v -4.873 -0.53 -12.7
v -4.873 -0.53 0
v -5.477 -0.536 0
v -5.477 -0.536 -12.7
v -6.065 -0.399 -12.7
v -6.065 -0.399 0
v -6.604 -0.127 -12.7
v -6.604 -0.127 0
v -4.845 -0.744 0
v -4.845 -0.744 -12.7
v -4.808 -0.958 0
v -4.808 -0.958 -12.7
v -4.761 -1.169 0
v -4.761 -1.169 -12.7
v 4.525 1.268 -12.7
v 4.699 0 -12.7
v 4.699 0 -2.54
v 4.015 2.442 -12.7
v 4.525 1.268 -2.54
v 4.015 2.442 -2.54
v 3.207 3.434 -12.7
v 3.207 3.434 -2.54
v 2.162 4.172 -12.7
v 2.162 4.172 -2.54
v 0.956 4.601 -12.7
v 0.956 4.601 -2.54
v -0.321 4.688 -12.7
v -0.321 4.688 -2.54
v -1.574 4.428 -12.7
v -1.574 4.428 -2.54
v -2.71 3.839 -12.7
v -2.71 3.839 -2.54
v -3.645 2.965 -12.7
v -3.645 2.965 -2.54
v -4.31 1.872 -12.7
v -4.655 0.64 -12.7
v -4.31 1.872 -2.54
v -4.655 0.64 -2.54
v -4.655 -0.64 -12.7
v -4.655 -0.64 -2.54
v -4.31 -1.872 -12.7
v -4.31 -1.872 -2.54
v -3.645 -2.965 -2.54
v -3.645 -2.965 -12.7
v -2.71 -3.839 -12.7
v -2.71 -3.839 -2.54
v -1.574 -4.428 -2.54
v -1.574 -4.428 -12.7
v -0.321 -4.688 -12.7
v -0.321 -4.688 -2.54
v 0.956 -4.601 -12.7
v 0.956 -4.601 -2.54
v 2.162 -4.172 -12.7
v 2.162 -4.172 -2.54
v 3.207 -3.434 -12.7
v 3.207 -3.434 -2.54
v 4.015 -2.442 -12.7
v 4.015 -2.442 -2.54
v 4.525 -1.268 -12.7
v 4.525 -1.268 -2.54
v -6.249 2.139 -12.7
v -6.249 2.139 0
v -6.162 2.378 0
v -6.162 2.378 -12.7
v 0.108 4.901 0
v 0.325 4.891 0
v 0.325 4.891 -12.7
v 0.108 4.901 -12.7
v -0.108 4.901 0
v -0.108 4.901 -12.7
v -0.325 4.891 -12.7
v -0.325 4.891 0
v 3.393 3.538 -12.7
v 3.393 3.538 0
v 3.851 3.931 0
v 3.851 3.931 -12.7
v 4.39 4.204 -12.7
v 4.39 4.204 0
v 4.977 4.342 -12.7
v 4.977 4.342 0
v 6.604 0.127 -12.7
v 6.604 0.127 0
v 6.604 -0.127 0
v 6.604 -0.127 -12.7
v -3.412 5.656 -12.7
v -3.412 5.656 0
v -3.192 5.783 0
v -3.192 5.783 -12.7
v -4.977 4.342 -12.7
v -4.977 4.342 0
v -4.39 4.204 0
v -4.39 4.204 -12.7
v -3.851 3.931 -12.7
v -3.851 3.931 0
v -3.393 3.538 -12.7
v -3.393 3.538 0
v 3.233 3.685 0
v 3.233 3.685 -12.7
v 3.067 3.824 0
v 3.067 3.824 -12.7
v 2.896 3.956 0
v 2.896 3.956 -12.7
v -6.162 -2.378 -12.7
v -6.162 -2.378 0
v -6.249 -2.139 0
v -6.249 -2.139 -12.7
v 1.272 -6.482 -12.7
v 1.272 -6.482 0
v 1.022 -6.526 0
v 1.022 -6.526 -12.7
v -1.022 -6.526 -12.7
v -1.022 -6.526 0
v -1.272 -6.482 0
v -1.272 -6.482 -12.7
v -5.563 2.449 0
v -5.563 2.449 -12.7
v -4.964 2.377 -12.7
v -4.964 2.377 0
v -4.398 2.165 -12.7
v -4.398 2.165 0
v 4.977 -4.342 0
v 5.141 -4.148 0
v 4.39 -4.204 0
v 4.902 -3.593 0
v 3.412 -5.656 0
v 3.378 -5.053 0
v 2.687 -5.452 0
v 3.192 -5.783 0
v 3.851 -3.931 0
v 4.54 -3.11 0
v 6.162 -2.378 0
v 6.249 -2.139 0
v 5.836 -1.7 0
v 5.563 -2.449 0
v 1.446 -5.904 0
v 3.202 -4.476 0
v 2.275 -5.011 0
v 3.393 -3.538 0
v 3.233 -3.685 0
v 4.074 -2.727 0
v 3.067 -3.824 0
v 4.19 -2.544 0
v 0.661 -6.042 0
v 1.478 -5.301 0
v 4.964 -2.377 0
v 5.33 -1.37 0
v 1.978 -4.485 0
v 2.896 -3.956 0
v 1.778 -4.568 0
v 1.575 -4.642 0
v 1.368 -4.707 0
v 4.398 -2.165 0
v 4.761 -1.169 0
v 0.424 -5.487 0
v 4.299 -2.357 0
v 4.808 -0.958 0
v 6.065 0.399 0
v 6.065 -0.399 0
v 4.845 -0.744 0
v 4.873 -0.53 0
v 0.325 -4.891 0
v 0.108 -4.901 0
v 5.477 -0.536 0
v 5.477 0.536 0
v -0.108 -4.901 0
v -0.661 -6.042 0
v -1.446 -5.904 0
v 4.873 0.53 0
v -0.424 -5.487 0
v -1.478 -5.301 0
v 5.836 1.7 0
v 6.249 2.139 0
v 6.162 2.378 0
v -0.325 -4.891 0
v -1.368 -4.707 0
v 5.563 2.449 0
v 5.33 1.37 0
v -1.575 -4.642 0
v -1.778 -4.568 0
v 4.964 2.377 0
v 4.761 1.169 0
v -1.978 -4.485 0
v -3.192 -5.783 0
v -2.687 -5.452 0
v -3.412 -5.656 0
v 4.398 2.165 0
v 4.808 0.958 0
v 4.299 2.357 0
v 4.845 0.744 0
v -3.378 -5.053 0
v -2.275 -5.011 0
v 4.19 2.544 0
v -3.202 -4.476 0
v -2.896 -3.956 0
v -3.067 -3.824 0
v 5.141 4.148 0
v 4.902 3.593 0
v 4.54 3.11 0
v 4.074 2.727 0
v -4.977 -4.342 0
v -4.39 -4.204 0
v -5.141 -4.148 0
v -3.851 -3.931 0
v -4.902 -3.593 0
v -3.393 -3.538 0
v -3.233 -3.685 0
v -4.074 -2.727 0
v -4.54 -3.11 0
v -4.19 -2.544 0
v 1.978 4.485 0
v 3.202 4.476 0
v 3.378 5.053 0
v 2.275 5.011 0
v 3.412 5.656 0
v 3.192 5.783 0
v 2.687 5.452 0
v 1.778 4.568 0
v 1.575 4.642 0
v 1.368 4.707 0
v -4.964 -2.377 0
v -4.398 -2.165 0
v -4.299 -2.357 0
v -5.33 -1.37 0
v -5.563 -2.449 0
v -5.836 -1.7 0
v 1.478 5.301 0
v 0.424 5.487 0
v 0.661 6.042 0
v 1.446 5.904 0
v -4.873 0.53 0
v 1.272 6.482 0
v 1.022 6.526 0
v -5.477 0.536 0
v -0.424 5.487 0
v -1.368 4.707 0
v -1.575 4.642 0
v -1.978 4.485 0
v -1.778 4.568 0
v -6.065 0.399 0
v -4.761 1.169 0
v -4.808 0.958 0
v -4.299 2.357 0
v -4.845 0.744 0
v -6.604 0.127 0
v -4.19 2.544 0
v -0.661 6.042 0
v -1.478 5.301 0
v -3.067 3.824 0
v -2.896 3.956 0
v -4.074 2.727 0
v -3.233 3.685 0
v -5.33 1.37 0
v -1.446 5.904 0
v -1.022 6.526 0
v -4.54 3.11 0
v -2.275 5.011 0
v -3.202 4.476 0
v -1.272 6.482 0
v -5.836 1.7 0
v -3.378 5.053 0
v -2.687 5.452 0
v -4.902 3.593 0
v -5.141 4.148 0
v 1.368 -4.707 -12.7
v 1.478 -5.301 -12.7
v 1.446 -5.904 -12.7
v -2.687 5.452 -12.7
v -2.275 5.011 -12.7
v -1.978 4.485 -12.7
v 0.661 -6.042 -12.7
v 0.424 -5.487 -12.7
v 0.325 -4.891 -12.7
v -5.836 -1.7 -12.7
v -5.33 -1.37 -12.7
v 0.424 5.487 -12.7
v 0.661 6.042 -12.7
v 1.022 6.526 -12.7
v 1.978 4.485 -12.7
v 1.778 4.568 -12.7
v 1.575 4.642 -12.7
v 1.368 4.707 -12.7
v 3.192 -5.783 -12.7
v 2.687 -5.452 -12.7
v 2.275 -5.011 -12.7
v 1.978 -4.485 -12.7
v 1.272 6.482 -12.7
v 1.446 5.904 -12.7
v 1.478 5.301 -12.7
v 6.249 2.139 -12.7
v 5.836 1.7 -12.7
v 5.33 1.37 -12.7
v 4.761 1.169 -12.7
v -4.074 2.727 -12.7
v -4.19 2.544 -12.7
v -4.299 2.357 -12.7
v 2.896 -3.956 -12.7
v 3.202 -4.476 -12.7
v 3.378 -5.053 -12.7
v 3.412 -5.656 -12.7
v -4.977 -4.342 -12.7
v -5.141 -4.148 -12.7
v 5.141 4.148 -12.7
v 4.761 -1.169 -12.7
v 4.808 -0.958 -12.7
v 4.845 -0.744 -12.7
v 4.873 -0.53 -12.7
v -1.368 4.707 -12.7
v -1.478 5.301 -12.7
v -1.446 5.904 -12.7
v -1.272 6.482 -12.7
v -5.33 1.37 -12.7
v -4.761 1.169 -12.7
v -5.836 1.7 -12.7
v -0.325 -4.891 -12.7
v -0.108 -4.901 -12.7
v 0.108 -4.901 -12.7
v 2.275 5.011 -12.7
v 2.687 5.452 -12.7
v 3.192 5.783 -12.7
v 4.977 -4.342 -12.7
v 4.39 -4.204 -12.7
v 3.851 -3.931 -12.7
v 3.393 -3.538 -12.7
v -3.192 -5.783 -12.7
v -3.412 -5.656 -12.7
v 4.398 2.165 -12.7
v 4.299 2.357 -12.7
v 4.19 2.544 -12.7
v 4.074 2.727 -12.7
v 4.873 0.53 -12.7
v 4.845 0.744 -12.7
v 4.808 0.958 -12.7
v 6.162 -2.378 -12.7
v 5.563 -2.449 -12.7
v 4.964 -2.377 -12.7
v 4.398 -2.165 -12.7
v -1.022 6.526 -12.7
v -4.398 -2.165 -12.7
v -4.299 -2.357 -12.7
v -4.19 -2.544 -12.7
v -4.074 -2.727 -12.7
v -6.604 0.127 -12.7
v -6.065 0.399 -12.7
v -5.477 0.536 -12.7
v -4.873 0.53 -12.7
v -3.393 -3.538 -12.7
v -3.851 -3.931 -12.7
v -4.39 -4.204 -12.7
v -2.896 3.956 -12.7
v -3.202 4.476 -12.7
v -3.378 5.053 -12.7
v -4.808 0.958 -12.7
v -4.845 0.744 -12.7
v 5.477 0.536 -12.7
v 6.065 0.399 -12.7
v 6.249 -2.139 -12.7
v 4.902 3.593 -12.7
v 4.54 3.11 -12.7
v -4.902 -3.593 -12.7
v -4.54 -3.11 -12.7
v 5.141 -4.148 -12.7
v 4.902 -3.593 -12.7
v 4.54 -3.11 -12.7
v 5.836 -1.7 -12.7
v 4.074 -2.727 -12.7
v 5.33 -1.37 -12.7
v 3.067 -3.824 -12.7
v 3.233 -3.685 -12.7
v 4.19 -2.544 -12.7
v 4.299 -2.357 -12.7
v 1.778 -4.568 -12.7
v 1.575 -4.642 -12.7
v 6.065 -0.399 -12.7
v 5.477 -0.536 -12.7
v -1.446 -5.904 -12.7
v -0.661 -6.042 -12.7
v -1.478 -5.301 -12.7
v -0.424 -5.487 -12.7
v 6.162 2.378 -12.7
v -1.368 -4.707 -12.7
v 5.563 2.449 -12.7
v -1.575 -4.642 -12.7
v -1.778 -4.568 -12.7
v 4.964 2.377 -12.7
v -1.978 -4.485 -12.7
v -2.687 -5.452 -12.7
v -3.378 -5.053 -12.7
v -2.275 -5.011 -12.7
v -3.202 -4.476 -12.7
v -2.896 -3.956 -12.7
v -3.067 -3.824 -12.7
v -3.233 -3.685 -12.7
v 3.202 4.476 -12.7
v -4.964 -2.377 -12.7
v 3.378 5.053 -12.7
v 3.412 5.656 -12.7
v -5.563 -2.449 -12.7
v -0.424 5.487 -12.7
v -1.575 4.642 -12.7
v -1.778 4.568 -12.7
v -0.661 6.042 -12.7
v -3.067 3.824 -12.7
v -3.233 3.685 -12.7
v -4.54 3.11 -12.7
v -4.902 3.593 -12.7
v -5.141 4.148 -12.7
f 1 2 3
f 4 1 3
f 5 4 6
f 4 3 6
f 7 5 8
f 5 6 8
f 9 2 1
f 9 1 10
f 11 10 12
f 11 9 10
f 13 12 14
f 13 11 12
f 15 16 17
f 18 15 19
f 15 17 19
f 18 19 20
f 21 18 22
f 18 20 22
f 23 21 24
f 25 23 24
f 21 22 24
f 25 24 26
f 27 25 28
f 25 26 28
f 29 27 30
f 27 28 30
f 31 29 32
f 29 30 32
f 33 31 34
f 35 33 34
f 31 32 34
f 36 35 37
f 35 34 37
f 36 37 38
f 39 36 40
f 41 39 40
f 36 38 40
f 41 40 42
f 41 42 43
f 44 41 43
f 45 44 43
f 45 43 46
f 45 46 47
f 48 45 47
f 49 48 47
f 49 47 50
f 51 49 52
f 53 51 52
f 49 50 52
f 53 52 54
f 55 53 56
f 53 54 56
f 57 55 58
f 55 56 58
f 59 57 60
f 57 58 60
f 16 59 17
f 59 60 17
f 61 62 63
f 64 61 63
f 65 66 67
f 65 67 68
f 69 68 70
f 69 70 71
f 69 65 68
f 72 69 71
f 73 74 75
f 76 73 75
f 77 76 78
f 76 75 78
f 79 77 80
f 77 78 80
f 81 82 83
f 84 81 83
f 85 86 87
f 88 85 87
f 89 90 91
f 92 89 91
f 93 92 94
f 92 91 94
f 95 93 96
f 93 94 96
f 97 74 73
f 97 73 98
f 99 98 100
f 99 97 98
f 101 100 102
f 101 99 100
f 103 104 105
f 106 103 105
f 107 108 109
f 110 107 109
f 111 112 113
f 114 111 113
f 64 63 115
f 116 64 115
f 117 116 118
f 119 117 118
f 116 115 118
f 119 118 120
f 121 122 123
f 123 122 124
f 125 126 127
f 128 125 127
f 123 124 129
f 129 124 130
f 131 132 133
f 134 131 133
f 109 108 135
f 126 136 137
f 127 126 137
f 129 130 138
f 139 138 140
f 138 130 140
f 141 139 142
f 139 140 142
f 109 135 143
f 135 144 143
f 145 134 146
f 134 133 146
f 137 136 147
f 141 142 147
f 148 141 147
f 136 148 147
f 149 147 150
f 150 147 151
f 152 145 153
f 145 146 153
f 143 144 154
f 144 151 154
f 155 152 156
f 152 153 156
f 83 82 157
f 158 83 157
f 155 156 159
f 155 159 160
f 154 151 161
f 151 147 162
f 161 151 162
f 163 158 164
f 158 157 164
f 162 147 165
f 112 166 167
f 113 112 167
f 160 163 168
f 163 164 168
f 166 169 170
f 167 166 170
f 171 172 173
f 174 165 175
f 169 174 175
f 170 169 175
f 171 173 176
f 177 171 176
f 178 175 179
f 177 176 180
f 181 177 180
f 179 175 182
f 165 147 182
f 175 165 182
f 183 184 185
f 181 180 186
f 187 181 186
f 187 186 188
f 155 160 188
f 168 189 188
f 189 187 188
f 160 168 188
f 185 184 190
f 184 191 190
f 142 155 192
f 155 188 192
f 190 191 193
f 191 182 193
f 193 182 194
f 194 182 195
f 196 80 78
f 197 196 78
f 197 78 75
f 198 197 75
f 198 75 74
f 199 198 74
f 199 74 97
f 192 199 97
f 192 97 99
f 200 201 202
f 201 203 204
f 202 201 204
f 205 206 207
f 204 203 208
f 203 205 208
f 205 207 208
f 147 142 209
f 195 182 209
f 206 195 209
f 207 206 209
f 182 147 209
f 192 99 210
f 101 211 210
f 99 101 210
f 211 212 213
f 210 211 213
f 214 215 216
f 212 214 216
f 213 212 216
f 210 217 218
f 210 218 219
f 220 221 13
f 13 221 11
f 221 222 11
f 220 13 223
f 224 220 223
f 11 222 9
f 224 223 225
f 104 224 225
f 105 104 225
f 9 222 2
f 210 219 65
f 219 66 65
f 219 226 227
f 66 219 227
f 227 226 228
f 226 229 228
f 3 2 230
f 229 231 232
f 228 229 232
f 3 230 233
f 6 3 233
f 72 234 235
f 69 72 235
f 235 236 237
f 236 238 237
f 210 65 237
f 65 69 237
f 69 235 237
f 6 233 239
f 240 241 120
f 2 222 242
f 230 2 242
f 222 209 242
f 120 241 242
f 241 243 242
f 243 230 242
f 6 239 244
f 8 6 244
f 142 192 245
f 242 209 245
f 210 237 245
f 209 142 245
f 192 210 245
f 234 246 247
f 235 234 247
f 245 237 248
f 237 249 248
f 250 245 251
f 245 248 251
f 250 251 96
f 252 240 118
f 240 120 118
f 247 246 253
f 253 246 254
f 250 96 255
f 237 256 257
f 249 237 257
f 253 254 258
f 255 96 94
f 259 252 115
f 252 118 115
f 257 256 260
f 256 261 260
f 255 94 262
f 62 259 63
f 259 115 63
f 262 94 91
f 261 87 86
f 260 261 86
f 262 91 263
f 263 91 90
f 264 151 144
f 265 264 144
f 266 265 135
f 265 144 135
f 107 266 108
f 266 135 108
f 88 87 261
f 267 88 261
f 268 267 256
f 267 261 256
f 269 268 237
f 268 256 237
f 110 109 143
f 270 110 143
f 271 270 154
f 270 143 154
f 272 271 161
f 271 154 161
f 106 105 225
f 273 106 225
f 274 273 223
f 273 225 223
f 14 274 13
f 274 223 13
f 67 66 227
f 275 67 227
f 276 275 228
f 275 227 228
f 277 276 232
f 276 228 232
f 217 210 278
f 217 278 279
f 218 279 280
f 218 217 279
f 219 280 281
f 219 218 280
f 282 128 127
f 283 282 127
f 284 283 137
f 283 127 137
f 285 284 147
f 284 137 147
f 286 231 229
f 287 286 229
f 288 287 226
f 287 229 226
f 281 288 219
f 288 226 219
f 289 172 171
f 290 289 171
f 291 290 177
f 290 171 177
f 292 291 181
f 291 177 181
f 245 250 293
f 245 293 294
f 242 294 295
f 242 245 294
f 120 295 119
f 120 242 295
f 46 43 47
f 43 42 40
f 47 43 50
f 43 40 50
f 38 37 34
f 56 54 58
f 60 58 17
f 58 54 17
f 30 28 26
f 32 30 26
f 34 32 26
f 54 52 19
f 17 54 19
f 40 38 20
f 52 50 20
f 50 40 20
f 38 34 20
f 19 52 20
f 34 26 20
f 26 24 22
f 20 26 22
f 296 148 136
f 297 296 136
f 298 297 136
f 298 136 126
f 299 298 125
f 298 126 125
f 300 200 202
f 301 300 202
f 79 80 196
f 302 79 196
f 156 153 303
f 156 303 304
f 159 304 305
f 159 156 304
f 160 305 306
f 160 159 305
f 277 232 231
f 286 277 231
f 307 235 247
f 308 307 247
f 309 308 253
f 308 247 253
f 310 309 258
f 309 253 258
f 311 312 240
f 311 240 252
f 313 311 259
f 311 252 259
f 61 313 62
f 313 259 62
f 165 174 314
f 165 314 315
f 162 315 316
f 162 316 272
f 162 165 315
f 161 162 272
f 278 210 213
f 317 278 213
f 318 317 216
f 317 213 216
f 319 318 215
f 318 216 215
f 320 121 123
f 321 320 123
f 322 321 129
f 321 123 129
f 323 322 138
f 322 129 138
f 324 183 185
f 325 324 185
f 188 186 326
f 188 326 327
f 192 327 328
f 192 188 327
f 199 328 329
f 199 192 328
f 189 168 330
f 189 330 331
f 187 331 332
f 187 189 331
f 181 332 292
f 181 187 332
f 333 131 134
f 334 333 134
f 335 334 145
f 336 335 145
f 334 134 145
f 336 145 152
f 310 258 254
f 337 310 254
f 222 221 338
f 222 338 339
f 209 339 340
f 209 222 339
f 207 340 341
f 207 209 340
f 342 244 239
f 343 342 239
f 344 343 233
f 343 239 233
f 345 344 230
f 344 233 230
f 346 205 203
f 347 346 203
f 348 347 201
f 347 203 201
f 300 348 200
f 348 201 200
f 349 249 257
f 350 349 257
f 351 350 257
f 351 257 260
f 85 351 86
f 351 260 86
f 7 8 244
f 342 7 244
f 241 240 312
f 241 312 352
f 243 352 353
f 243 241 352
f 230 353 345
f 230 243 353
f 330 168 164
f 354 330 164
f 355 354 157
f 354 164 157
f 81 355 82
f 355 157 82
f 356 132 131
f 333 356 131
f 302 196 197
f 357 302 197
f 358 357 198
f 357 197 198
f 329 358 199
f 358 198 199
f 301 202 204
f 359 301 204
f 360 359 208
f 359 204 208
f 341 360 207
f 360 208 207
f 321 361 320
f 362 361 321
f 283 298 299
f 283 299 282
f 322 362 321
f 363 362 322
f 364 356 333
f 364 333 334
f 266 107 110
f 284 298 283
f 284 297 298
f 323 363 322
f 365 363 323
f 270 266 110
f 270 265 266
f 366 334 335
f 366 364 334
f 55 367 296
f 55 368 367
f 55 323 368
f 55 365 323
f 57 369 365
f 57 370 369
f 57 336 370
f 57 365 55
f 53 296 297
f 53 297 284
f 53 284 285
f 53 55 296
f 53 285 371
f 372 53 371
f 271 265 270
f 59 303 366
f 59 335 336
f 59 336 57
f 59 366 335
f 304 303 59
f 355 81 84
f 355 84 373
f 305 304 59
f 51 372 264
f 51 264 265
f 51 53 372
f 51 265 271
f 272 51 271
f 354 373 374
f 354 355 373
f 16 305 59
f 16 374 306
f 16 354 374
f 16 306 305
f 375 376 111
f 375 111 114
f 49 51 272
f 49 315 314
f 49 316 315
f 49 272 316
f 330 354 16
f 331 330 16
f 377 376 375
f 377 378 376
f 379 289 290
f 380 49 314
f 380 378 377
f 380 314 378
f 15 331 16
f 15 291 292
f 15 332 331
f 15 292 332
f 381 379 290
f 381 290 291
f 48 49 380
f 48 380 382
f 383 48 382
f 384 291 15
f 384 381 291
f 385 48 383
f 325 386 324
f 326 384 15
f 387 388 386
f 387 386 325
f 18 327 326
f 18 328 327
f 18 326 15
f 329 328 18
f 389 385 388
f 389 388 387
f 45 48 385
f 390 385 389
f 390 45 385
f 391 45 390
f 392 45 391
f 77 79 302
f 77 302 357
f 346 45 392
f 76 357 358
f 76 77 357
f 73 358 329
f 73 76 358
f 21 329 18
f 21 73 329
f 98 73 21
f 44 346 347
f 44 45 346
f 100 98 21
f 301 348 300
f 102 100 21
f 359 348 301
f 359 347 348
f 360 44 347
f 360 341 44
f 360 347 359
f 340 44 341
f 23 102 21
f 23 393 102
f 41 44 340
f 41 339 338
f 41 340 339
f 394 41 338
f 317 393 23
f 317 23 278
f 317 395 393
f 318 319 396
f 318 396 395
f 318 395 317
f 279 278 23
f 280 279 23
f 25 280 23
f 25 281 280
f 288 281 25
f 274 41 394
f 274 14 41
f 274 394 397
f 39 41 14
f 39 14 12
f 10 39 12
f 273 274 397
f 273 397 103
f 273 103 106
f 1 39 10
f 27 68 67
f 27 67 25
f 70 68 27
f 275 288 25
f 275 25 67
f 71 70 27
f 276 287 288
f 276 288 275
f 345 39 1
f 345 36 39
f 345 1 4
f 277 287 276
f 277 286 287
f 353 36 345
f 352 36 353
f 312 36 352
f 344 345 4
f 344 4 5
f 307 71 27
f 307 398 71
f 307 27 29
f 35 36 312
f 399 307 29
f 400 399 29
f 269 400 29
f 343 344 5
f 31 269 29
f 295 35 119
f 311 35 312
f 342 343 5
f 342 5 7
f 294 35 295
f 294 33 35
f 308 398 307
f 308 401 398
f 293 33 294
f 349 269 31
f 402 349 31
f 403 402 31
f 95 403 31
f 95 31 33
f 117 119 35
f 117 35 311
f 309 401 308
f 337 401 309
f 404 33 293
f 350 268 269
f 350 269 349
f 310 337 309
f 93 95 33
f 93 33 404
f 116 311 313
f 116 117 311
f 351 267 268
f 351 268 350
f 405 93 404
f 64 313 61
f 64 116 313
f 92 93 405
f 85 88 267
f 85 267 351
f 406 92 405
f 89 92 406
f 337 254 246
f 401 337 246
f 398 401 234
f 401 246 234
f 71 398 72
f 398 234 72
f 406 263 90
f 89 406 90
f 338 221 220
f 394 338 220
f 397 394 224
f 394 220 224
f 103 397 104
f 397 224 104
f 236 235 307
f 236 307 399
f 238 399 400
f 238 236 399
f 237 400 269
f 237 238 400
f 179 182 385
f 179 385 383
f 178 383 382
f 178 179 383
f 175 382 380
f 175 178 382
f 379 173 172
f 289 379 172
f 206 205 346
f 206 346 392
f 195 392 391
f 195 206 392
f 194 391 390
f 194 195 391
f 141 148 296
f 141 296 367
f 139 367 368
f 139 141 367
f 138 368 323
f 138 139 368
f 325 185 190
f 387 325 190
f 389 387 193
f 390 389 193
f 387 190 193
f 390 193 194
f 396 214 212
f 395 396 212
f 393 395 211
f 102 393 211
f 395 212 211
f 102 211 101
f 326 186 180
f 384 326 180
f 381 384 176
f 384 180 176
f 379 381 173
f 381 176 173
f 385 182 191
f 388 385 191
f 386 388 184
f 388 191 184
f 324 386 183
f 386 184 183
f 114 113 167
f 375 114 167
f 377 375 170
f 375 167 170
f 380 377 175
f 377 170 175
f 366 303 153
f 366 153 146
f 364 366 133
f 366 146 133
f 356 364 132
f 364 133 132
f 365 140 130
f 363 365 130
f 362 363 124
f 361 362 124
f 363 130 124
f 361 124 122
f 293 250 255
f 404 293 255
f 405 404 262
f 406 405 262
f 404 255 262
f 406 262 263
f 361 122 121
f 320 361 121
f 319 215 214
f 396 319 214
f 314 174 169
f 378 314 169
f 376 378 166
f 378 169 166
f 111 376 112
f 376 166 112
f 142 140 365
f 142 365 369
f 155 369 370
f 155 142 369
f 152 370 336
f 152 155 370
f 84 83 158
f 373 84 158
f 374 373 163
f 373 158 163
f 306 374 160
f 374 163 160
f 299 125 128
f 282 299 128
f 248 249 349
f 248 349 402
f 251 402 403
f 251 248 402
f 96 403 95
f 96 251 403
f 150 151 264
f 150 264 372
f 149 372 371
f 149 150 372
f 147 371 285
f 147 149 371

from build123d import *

# Parameters (mm, degrees)
BOSS_EXTRUDE1_DEPTH = 12.7
LARGER_TEETH_DEPTH  = 12.7
CUT_EXTRUDE1_START  = -2.54
SKETCH2_R           = 4.699
CUT_EXTRUDE1_DEPTH  = 10.16


with BuildPart() as part:
    # Sketch1 → Boss-Extrude1 (new body)
    with BuildSketch(Plane.XY):
        with BuildLine():
            ThreePointArc((4.073847183, 2.72678088), (4.623694629, 3.268673913), (4.961814921, 3.962687559))
            ThreePointArc((4.961814921, 3.962687559), (4.864382214, 4.081701322), (4.76409555, 4.19832033))
            ThreePointArc((4.76409555, 4.19832033), (4.021911558, 3.98585105), (3.392771091, 3.53845576))
            ThreePointArc((3.392771091, 3.53845576), (3.15107342, 3.755303069), (2.895550149, 3.955673669))
            ThreePointArc((2.895550149, 3.955673669), (3.226899403, 4.652945455), (3.3072619, 5.420748908))
            ThreePointArc((3.3072619, 5.420748908), (3.175, 5.499261314), (3.040875312, 5.574547276))
            ThreePointArc((3.040875312, 5.574547276), (2.416119265, 5.121049586), (1.977938812, 4.485456821))
            ThreePointArc((1.977938812, 4.485456821), (1.676651147, 4.606561166), (1.368007033, 4.707453834))
            ThreePointArc((1.368007033, 4.707453834), (1.440892486, 5.476003106), (1.253804284, 6.224987937))
            ThreePointArc((1.253804284, 6.224987937), (1.102665928, 6.253529232), (0.950880633, 6.27840155))
            ThreePointArc((0.950880633, 6.27840155), (0.518907331, 5.638573964), (0.324537921, 4.891445592))
            ThreePointArc((0.324537921, 4.891445592), (0, 4.9022), (-0.324537921, 4.891445592))
            ThreePointArc((-0.324537921, 4.891445592), (-0.518907331, 5.638573964), (-0.950880633, 6.27840155))
            ThreePointArc((-0.950880633, 6.27840155), (-1.102665928, 6.253529232), (-1.253804284, 6.224987937))
            ThreePointArc((-1.253804284, 6.224987937), (-1.440892486, 5.476003106), (-1.368007033, 4.707453834))
            ThreePointArc((-1.368007033, 4.707453834), (-1.676651147, 4.606561166), (-1.977938812, 4.485456821))
            ThreePointArc((-1.977938812, 4.485456821), (-2.416119265, 5.121049586), (-3.040875312, 5.574547276))
            ThreePointArc((-3.040875312, 5.574547276), (-3.175, 5.499261314), (-3.3072619, 5.420748908))
            ThreePointArc((-3.3072619, 5.420748908), (-3.226899403, 4.652945455), (-2.895550149, 3.955673669))
            ThreePointArc((-2.895550149, 3.955673669), (-3.15107342, 3.755303069), (-3.392771091, 3.53845576))
            ThreePointArc((-3.392771091, 3.53845576), (-4.021911558, 3.98585105), (-4.76409555, 4.19832033))
            ThreePointArc((-4.76409555, 4.19832033), (-4.864382214, 4.081701322), (-4.961814921, 3.962687559))
            ThreePointArc((-4.961814921, 3.962687559), (-4.623694629, 3.268673913), (-4.073847183, 2.72678088))
            ThreePointArc((-4.073847183, 2.72678088), (-4.245429734, 2.4511), (-4.398385104, 2.164664712))
            ThreePointArc((-4.398385104, 2.164664712), (-5.14260196, 2.369900051), (-5.912695554, 2.315713991))
            ThreePointArc((-5.912695554, 2.315713991), (-5.967048142, 2.17182791), (-6.017899834, 2.026667607))
            ThreePointArc((-6.017899834, 2.026667607), (-5.462804044, 1.490152056), (-4.760778124, 1.168998074))
            ThreePointArc((-4.760778124, 1.168998074), (-4.827724567, 0.851258097), (-4.873488961, 0.529783153))
            ThreePointArc((-4.873488961, 0.529783153), (-5.643018669, 0.468104131), (-6.348137212, 0.153798368))
            ThreePointArc((-6.348137212, 0.153798368), (-6.35, 0), (-6.348137212, -0.153798368))
            ThreePointArc((-6.348137212, -0.153798368), (-5.643018669, -0.468104131), (-4.873488961, -0.529783153))
            ThreePointArc((-4.873488961, -0.529783153), (-4.827724567, -0.851258097), (-4.760778124, -1.168998074))
            ThreePointArc((-4.760778124, -1.168998074), (-5.462804044, -1.490152056), (-6.017899834, -2.026667607))
            ThreePointArc((-6.017899834, -2.026667607), (-5.967048142, -2.17182791), (-5.912695554, -2.315713991))
            ThreePointArc((-5.912695554, -2.315713991), (-5.14260196, -2.369900051), (-4.398385104, -2.164664712))
            ThreePointArc((-4.398385104, -2.164664712), (-4.245429734, -2.4511), (-4.073847183, -2.72678088))
            ThreePointArc((-4.073847183, -2.72678088), (-4.623694629, -3.268673913), (-4.961814921, -3.962687559))
            ThreePointArc((-4.961814921, -3.962687559), (-4.864382214, -4.081701322), (-4.76409555, -4.19832033))
            ThreePointArc((-4.76409555, -4.19832033), (-4.021911558, -3.98585105), (-3.392771091, -3.53845576))
            ThreePointArc((-3.392771091, -3.53845576), (-3.15107342, -3.755303069), (-2.895550149, -3.955673669))
            ThreePointArc((-2.895550149, -3.955673669), (-3.226899403, -4.652945455), (-3.3072619, -5.420748908))
            ThreePointArc((-3.3072619, -5.420748908), (-3.175, -5.499261314), (-3.040875312, -5.574547276))
            ThreePointArc((-3.040875312, -5.574547276), (-2.416119265, -5.121049586), (-1.977938812, -4.485456821))
            ThreePointArc((-1.977938812, -4.485456821), (-1.676651147, -4.606561166), (-1.368007033, -4.707453834))
            ThreePointArc((-1.368007033, -4.707453834), (-1.440892486, -5.476003106), (-1.253804284, -6.224987937))
            ThreePointArc((-1.253804284, -6.224987937), (-1.102665928, -6.253529232), (-0.950880633, -6.27840155))
            ThreePointArc((-0.950880633, -6.27840155), (-0.518907331, -5.638573964), (-0.324537921, -4.891445592))
            ThreePointArc((-0.324537921, -4.891445592), (0, -4.9022), (0.324537921, -4.891445592))
            ThreePointArc((0.324537921, -4.891445592), (0.518907331, -5.638573964), (0.950880633, -6.27840155))
            ThreePointArc((0.950880633, -6.27840155), (1.102665928, -6.253529232), (1.253804284, -6.224987937))
            ThreePointArc((1.253804284, -6.224987937), (1.440892486, -5.476003106), (1.368007033, -4.707453834))
            ThreePointArc((1.368007033, -4.707453834), (1.676651147, -4.606561166), (1.977938812, -4.485456821))
            ThreePointArc((1.977938812, -4.485456821), (2.416119265, -5.121049586), (3.040875312, -5.574547276))
            ThreePointArc((3.040875312, -5.574547276), (3.175, -5.499261314), (3.3072619, -5.420748908))
            ThreePointArc((3.3072619, -5.420748908), (3.226899403, -4.652945455), (2.895550149, -3.955673669))
            ThreePointArc((2.895550149, -3.955673669), (3.15107342, -3.755303069), (3.392771091, -3.53845576))
            ThreePointArc((3.392771091, -3.53845576), (4.021911558, -3.98585105), (4.76409555, -4.19832033))
            ThreePointArc((4.76409555, -4.19832033), (4.864382214, -4.081701322), (4.961814921, -3.962687559))
            ThreePointArc((4.961814921, -3.962687559), (4.623694629, -3.268673913), (4.073847183, -2.72678088))
            ThreePointArc((4.073847183, -2.72678088), (4.245429734, -2.4511), (4.398385104, -2.164664712))
            ThreePointArc((4.398385104, -2.164664712), (5.14260196, -2.369900051), (5.912695554, -2.315713991))
            ThreePointArc((5.912695554, -2.315713991), (5.967048142, -2.17182791), (6.017899834, -2.026667607))
            ThreePointArc((6.017899834, -2.026667607), (5.462804044, -1.490152056), (4.760778124, -1.168998074))
            ThreePointArc((4.760778124, -1.168998074), (4.827724567, -0.851258097), (4.873488961, -0.529783153))
            ThreePointArc((4.873488961, -0.529783153), (5.643018669, -0.468104131), (6.348137212, -0.153798368))
            ThreePointArc((6.348137212, -0.153798368), (6.35, 0), (6.348137212, 0.153798368))
            ThreePointArc((6.348137212, 0.153798368), (5.643018669, 0.468104131), (4.873488961, 0.529783153))
            ThreePointArc((4.873488961, 0.529783153), (4.827724567, 0.851258097), (4.760778124, 1.168998074))
            ThreePointArc((4.760778124, 1.168998074), (5.462804044, 1.490152056), (6.017899834, 2.026667607))
            ThreePointArc((6.017899834, 2.026667607), (5.967048142, 2.17182791), (5.912695554, 2.315713991))
            ThreePointArc((5.912695554, 2.315713991), (5.14260196, 2.369900051), (4.398385104, 2.164664712))
            ThreePointArc((4.398385104, 2.164664712), (4.245429734, 2.4511), (4.073847183, 2.72678088))
        make_face()
    extrude(amount=-BOSS_EXTRUDE1_DEPTH)

    # Sketch3 → Larger_Teeth (add)
    with BuildSketch(Plane.XY):
        with BuildLine():
            Line((6.604, 0.127), (6.604, -0.127))
            ThreePointArc((6.604, -0.127), (5.775112058, -0.48464065), (4.873488961, -0.529783153))
            ThreePointArc((4.873488961, -0.529783153), (4.827724567, -0.851258097), (4.760778124, -1.168998074))
            ThreePointArc((4.760778124, -1.168998074), (5.592587049, -1.519791412), (6.249166626, -2.139360064))
            Line((6.249166626, -2.139360064), (6.162293509, -2.378041989))
            ThreePointArc((6.162293509, -2.378041989), (5.261073321, -2.430617896), (4.398385104, -2.164664712))
            ThreePointArc((4.398385104, -2.164664712), (4.245429734, -2.4511), (4.073847183, -2.72678088))
            ThreePointArc((4.073847183, -2.72678088), (4.735513505, -3.340914199), (5.140591529, -4.14768173))
            Line((5.140591529, -4.14768173), (4.977323476, -4.342257019))
            ThreePointArc((4.977323476, -4.342257019), (4.112471496, -4.083426752), (3.392771091, -3.53845576))
            ThreePointArc((3.392771091, -3.53845576), (3.15107342, -3.755303069), (2.895550149, -3.955673669))
            ThreePointArc((2.895550149, -3.955673669), (3.307267143, -4.759073427), (3.411985226, -5.655731767))
            Line((3.411985226, -5.655731767), (3.192014774, -5.782731767))
            ThreePointArc((3.192014774, -5.782731767), (2.467844915, -5.243714077), (1.977938812, -4.485456821))
            ThreePointArc((1.977938812, -4.485456821), (1.676651147, -4.606561166), (1.368007033, -4.707453834))
            ThreePointArc((1.368007033, -4.707453834), (1.480115554, -5.603218164), (1.27184315, -6.481617082))
            Line((1.27184315, -6.481617082), (1.021701981, -6.525723719))
            ThreePointArc((1.021701981, -6.525723719), (0.525559816, -5.771532095), (0.324537921, -4.891445592))
            ThreePointArc((0.324537921, -4.891445592), (0, -4.9022), (-0.324537921, -4.891445592))
            ThreePointArc((-0.324537921, -4.891445592), (-0.525559816, -5.771532095), (-1.021701981, -6.525723719))
            Line((-1.021701981, -6.525723719), (-1.27184315, -6.481617082))
            ThreePointArc((-1.27184315, -6.481617082), (-1.480115554, -5.603218164), (-1.368007033, -4.707453834))
            ThreePointArc((-1.368007033, -4.707453834), (-1.676651147, -4.606561166), (-1.977938812, -4.485456821))
            ThreePointArc((-1.977938812, -4.485456821), (-2.467844915, -5.243714077), (-3.192014774, -5.782731767))
            Line((-3.192014774, -5.782731767), (-3.411985226, -5.655731767))
            ThreePointArc((-3.411985226, -5.655731767), (-3.307267143, -4.759073427), (-2.895550149, -3.955673669))
            ThreePointArc((-2.895550149, -3.955673669), (-3.15107342, -3.755303069), (-3.392771091, -3.53845576))
            ThreePointArc((-3.392771091, -3.53845576), (-4.112471496, -4.083426752), (-4.977323476, -4.342257019))
            Line((-4.977323476, -4.342257019), (-5.140591529, -4.14768173))
            ThreePointArc((-5.140591529, -4.14768173), (-4.735513505, -3.340914199), (-4.073847183, -2.72678088))
            ThreePointArc((-4.073847183, -2.72678088), (-4.245429734, -2.4511), (-4.398385104, -2.164664712))
            ThreePointArc((-4.398385104, -2.164664712), (-5.261073321, -2.430617896), (-6.162293509, -2.378041989))
            Line((-6.162293509, -2.378041989), (-6.249166626, -2.139360064))
            ThreePointArc((-6.249166626, -2.139360064), (-5.592587049, -1.519791412), (-4.760778124, -1.168998074))
            ThreePointArc((-4.760778124, -1.168998074), (-4.827724567, -0.851258097), (-4.873488961, -0.529783153))
            ThreePointArc((-4.873488961, -0.529783153), (-5.775112058, -0.48464065), (-6.604, -0.127))
            Line((-6.604, -0.127), (-6.604, 0.127))
            ThreePointArc((-6.604, 0.127), (-5.775112058, 0.48464065), (-4.873488961, 0.529783153))
            ThreePointArc((-4.873488961, 0.529783153), (-4.827724567, 0.851258097), (-4.760778124, 1.168998074))
            ThreePointArc((-4.760778124, 1.168998074), (-5.592587049, 1.519791412), (-6.249166626, 2.139360064))
            Line((-6.249166626, 2.139360064), (-6.162293509, 2.378041989))
            ThreePointArc((-6.162293509, 2.378041989), (-5.261073321, 2.430617896), (-4.398385104, 2.164664712))
            ThreePointArc((-4.398385104, 2.164664712), (-4.245429734, 2.4511), (-4.073847183, 2.72678088))
            ThreePointArc((-4.073847183, 2.72678088), (-4.735513505, 3.340914199), (-5.140591529, 4.14768173))
            Line((-5.140591529, 4.14768173), (-4.977323476, 4.342257019))
            ThreePointArc((-4.977323476, 4.342257019), (-4.112471496, 4.083426752), (-3.392771091, 3.53845576))
            ThreePointArc((-3.392771091, 3.53845576), (-3.15107342, 3.755303069), (-2.895550149, 3.955673669))
            ThreePointArc((-2.895550149, 3.955673669), (-3.307267143, 4.759073427), (-3.411985226, 5.655731767))
            Line((-3.411985226, 5.655731767), (-3.192014774, 5.782731767))
            ThreePointArc((-3.192014774, 5.782731767), (-2.467844915, 5.243714077), (-1.977938812, 4.485456821))
            ThreePointArc((-1.977938812, 4.485456821), (-1.676651147, 4.606561166), (-1.368007033, 4.707453834))
            ThreePointArc((-1.368007033, 4.707453834), (-1.480115554, 5.603218164), (-1.27184315, 6.481617082))
            Line((-1.27184315, 6.481617082), (-1.021701981, 6.525723719))
            ThreePointArc((-1.021701981, 6.525723719), (-0.525559816, 5.771532095), (-0.324537921, 4.891445592))
            ThreePointArc((-0.324537921, 4.891445592), (0, 4.9022), (0.324537921, 4.891445592))
            ThreePointArc((0.324537921, 4.891445592), (0.525559816, 5.771532095), (1.021701981, 6.525723719))
            Line((1.021701981, 6.525723719), (1.27184315, 6.481617082))
            ThreePointArc((1.27184315, 6.481617082), (1.480115554, 5.603218164), (1.368007033, 4.707453834))
            ThreePointArc((1.368007033, 4.707453834), (1.676651147, 4.606561166), (1.977938812, 4.485456821))
            ThreePointArc((1.977938812, 4.485456821), (2.467844915, 5.243714077), (3.192014774, 5.782731767))
            Line((3.192014774, 5.782731767), (3.411985226, 5.655731767))
            ThreePointArc((3.411985226, 5.655731767), (3.307267143, 4.759073427), (2.895550149, 3.955673669))
            ThreePointArc((2.895550149, 3.955673669), (3.15107342, 3.755303069), (3.392771091, 3.53845576))
            ThreePointArc((3.392771091, 3.53845576), (4.112471496, 4.083426752), (4.977323476, 4.342257019))
            Line((4.977323476, 4.342257019), (5.140591529, 4.14768173))
            ThreePointArc((5.140591529, 4.14768173), (4.735513505, 3.340914199), (4.073847183, 2.72678088))
            ThreePointArc((4.073847183, 2.72678088), (4.245429734, 2.4511), (4.398385104, 2.164664712))
            ThreePointArc((4.398385104, 2.164664712), (5.261073321, 2.430617896), (6.162293509, 2.378041989))
            Line((6.162293509, 2.378041989), (6.249166626, 2.139360064))
            ThreePointArc((6.249166626, 2.139360064), (5.592587049, 1.519791412), (4.760778124, 1.168998074))
            ThreePointArc((4.760778124, 1.168998074), (4.827724567, 0.851258097), (4.873488961, 0.529783153))
            ThreePointArc((4.873488961, 0.529783153), (5.775112058, 0.48464065), (6.604, 0.127))
        make_face()
    extrude(amount=-LARGER_TEETH_DEPTH)

    # Sketch2 → Cut-Extrude1 (cut)
    with BuildSketch(Plane.XY.offset(CUT_EXTRUDE1_START)):
        Circle(SKETCH2_R)
    extrude(amount=-CUT_EXTRUDE1_DEPTH, mode=Mode.SUBTRACT)


solid = part.part
